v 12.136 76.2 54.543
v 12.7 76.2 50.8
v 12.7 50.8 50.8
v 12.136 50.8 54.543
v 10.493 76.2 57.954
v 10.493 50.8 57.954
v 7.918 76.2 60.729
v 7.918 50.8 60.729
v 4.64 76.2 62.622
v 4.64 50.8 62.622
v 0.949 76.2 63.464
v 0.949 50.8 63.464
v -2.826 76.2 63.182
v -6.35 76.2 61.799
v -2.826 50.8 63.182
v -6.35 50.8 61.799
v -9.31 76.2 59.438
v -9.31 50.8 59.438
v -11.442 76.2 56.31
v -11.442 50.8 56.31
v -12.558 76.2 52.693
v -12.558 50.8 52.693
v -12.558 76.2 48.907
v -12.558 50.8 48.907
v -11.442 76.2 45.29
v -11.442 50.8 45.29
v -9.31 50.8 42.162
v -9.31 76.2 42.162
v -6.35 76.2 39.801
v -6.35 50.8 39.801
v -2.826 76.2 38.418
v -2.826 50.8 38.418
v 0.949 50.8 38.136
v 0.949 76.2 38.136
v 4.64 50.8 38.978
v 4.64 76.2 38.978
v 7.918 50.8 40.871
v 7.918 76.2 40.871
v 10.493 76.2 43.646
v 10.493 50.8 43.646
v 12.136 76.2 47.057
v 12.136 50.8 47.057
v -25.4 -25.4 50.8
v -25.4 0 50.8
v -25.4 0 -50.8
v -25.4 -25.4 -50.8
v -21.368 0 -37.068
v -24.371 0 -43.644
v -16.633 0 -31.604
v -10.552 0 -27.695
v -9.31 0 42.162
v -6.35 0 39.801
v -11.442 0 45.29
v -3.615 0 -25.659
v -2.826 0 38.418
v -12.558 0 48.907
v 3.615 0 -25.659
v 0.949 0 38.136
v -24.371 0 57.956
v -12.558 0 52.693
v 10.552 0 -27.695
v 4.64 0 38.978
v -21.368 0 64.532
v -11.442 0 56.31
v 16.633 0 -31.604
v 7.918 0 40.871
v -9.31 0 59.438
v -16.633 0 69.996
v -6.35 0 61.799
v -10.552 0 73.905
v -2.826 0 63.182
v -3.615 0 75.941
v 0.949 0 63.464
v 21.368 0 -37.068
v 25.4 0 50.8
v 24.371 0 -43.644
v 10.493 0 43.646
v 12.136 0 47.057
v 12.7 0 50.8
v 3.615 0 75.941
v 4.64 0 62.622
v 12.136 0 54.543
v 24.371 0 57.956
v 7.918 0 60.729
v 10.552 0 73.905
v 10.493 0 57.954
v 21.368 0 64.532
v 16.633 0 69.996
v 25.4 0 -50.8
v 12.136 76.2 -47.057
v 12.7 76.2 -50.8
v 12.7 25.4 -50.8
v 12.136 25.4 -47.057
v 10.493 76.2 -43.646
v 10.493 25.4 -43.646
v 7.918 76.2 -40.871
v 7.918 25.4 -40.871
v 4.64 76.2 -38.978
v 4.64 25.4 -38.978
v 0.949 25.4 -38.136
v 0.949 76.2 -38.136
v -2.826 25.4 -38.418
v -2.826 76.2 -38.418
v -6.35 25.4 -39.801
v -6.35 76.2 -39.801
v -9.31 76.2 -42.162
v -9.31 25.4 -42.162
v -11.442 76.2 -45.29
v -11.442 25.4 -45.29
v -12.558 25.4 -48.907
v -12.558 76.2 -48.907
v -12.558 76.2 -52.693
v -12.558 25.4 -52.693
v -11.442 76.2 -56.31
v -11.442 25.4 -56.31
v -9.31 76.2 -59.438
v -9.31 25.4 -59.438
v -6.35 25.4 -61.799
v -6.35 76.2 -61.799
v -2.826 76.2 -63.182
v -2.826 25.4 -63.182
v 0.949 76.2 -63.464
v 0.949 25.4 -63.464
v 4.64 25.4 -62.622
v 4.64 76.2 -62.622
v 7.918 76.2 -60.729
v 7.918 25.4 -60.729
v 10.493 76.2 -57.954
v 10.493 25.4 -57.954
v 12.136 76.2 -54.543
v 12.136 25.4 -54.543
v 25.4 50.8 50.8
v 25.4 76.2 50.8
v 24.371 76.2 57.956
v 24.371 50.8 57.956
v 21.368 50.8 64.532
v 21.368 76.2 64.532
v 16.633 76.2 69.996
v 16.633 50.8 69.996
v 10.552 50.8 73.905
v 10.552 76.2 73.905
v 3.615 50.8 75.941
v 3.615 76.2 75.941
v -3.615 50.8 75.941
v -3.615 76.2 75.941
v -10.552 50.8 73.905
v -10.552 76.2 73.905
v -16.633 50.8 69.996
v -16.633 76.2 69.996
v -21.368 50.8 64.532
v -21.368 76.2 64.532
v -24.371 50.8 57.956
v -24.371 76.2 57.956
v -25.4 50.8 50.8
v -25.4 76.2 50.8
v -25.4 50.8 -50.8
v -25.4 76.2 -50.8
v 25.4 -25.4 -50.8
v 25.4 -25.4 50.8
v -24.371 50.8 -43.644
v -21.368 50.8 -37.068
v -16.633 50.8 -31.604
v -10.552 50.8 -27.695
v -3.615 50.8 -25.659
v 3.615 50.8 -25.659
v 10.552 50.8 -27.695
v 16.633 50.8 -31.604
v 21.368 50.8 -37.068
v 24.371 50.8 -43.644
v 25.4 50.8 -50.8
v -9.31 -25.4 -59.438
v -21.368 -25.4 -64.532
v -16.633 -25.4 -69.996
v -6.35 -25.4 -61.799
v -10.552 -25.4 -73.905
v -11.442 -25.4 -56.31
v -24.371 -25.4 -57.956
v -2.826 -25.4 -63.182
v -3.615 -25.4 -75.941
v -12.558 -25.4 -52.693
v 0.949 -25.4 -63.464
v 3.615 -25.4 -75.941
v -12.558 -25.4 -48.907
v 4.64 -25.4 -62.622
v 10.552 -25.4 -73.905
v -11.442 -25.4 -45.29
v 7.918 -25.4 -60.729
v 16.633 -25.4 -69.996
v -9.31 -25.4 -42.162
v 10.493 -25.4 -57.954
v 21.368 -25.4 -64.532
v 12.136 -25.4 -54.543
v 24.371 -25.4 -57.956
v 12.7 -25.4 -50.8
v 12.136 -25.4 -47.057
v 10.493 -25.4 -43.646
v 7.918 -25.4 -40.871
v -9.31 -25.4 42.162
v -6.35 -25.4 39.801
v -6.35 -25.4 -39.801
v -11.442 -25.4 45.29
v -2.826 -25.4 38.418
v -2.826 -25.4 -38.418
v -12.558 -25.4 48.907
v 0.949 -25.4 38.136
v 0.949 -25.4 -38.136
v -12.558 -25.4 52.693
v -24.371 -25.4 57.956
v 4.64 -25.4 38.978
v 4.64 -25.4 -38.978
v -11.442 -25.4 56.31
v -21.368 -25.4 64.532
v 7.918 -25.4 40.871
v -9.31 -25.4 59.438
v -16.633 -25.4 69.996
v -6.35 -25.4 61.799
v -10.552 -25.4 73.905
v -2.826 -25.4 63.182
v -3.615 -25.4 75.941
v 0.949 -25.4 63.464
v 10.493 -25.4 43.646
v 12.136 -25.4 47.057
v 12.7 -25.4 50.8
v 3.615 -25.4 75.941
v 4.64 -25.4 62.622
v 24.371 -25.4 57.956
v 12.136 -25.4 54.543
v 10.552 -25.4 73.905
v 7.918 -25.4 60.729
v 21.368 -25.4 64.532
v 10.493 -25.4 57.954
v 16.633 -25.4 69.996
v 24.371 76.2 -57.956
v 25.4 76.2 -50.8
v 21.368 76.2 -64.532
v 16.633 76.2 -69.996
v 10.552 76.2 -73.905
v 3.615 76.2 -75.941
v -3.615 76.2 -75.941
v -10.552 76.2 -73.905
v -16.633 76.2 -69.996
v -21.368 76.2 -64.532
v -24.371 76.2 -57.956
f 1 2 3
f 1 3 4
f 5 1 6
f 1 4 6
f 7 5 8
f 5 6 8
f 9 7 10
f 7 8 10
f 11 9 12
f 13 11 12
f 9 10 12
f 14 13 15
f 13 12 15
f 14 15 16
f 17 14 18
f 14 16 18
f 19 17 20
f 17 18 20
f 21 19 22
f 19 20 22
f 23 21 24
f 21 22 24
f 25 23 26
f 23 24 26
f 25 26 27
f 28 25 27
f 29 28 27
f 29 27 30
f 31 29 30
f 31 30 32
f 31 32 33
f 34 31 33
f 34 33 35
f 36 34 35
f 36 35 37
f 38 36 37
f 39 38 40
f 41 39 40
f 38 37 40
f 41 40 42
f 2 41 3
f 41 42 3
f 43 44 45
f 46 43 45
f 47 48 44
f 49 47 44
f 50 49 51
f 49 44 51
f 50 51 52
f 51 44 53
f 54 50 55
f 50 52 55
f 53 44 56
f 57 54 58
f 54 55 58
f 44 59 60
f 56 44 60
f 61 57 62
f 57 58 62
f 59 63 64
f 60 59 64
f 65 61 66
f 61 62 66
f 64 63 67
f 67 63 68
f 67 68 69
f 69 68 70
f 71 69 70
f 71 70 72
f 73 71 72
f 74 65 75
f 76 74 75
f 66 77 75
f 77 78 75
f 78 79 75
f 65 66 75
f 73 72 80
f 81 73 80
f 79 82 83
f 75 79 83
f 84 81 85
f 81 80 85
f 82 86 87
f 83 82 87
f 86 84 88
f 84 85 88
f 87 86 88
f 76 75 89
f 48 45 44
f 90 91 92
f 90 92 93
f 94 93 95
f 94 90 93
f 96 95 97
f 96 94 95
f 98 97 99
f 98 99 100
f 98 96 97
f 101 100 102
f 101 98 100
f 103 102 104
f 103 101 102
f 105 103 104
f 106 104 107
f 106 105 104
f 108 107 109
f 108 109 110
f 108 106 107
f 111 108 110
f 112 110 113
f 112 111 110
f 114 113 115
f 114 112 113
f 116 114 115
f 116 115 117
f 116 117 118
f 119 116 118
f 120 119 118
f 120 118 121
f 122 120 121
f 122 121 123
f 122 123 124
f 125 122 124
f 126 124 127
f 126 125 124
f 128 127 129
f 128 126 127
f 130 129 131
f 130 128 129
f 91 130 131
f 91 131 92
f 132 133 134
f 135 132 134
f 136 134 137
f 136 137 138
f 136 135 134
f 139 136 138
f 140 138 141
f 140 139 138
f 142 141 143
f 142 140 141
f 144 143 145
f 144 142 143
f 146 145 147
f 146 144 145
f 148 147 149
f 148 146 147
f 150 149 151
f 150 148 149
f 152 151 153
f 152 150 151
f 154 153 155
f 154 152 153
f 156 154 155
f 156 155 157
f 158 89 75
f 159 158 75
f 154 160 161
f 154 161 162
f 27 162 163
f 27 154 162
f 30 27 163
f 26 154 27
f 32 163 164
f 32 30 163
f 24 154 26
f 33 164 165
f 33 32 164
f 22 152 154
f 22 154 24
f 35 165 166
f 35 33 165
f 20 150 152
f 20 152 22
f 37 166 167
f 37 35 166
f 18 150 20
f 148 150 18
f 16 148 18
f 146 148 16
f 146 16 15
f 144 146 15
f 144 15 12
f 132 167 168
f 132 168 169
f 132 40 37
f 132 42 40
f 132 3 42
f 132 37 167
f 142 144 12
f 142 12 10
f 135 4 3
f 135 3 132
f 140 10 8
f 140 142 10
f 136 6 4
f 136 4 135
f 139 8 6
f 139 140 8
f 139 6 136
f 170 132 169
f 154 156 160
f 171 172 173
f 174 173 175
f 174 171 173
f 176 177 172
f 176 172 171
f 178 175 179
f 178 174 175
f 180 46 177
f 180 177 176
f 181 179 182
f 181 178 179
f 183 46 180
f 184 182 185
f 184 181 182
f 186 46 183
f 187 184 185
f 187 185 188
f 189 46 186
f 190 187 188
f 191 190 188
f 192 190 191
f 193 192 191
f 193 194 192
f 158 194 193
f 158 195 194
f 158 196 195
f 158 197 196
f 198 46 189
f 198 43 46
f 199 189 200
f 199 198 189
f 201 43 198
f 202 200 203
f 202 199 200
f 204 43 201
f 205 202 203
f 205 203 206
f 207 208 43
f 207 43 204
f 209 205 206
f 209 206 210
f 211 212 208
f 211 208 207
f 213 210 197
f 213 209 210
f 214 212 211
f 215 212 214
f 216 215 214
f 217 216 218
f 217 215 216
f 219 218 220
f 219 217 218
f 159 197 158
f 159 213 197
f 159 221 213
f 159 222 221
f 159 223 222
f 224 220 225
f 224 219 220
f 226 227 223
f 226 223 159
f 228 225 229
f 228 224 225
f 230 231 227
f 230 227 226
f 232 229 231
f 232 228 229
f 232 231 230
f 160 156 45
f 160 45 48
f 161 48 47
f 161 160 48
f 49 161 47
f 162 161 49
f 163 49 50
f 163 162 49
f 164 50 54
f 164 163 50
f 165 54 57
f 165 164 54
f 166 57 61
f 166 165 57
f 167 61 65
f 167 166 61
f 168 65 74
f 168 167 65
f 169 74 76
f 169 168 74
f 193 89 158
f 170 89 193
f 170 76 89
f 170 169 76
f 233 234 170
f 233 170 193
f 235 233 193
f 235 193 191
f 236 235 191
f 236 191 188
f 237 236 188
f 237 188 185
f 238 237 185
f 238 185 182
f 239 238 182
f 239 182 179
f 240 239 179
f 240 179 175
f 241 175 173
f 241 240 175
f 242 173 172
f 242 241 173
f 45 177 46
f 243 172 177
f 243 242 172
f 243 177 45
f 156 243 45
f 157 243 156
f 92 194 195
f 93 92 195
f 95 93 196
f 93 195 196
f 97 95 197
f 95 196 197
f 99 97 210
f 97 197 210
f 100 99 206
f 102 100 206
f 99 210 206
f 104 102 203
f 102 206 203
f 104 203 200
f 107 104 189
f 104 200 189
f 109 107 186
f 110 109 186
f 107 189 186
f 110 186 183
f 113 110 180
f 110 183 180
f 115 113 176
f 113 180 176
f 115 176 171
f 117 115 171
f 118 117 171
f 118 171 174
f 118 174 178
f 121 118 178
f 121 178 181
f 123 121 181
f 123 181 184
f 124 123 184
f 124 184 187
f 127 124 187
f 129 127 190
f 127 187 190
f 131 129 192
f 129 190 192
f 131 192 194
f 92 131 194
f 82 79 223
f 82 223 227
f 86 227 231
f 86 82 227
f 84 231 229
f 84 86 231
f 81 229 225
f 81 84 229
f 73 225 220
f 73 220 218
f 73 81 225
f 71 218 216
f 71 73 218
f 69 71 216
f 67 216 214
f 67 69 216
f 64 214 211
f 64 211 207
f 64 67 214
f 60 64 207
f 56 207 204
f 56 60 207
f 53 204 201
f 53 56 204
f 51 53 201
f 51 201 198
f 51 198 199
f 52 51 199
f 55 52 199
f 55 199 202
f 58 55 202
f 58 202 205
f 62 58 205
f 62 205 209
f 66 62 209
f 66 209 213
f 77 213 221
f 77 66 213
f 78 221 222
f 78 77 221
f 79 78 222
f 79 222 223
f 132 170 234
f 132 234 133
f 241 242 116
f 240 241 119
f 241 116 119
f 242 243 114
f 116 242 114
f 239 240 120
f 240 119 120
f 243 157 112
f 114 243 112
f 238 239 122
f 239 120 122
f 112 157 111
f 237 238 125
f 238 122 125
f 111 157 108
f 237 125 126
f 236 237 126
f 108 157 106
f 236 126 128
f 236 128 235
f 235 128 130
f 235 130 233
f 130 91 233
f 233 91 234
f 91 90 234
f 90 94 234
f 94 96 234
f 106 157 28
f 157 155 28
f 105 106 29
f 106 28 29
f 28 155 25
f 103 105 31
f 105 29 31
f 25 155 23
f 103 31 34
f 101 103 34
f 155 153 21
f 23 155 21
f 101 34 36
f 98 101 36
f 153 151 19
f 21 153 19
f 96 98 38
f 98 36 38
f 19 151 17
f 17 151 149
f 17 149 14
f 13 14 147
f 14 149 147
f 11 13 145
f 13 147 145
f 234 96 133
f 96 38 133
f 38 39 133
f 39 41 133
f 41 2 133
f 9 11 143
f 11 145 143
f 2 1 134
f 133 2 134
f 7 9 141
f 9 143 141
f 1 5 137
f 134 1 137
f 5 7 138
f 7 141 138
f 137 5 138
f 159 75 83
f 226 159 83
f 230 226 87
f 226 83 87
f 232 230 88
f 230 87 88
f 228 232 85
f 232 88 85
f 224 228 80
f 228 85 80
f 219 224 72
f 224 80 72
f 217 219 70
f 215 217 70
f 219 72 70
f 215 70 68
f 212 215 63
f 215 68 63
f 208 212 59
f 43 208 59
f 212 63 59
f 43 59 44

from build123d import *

# Parameters (mm, degrees)
F0_R     = 12.7
F1_DEPTH = 25.4
F2_R     = 25.4
F3_DEPTH = 25.4
F4_R     = 12.7
F5_DEPTH = 50.801


with BuildPart() as f1:
    # F0 (on Front) → F1 (new body)
    with BuildSketch(Plane.XZ):
        with BuildLine():
            ThreePointArc((25.4, 50.8), (0, 76.2), (-25.4, 50.8))
            Line((-25.4, 50.8), (-25.4, -50.8))
            ThreePointArc((-25.4, -50.8), (0, -76.2), (25.4, -50.8))
            Line((25.4, -50.8), (25.4, 50.8))
        make_face()
        with Locations((0, -50.8)):
            Circle(F0_R, mode=Mode.SUBTRACT)
        with Locations((0, 50.8)):
            Circle(F0_R, mode=Mode.SUBTRACT)
    extrude(amount=F1_DEPTH)

    # F2 (on face) → F3 (join)
    with BuildSketch(Plane(origin=(0, 0, 0), x_dir=(-1, 0, 0), z_dir=(0, 1, 0))):
        with Locations((0, -50.8)):
            Circle(F2_R)
    extrude(amount=F3_DEPTH)

    # F4 (on face) → F5 (cut, through all)
    with BuildSketch(Plane.XZ.offset(25.4)):
        with Locations((0, -50.8)):
            Circle(F4_R)
    extrude(amount=-F5_DEPTH, mode=Mode.SUBTRACT)

    # F6: F1 across face


with BuildPart() as f1_1:
    add(f1.part)
    add(f1.part.mirror(Plane(origin=(0, 25.4, -50.8), x_dir=(-1, 0, 0), z_dir=(0, 1, 0))))


solid = f1_1.part
